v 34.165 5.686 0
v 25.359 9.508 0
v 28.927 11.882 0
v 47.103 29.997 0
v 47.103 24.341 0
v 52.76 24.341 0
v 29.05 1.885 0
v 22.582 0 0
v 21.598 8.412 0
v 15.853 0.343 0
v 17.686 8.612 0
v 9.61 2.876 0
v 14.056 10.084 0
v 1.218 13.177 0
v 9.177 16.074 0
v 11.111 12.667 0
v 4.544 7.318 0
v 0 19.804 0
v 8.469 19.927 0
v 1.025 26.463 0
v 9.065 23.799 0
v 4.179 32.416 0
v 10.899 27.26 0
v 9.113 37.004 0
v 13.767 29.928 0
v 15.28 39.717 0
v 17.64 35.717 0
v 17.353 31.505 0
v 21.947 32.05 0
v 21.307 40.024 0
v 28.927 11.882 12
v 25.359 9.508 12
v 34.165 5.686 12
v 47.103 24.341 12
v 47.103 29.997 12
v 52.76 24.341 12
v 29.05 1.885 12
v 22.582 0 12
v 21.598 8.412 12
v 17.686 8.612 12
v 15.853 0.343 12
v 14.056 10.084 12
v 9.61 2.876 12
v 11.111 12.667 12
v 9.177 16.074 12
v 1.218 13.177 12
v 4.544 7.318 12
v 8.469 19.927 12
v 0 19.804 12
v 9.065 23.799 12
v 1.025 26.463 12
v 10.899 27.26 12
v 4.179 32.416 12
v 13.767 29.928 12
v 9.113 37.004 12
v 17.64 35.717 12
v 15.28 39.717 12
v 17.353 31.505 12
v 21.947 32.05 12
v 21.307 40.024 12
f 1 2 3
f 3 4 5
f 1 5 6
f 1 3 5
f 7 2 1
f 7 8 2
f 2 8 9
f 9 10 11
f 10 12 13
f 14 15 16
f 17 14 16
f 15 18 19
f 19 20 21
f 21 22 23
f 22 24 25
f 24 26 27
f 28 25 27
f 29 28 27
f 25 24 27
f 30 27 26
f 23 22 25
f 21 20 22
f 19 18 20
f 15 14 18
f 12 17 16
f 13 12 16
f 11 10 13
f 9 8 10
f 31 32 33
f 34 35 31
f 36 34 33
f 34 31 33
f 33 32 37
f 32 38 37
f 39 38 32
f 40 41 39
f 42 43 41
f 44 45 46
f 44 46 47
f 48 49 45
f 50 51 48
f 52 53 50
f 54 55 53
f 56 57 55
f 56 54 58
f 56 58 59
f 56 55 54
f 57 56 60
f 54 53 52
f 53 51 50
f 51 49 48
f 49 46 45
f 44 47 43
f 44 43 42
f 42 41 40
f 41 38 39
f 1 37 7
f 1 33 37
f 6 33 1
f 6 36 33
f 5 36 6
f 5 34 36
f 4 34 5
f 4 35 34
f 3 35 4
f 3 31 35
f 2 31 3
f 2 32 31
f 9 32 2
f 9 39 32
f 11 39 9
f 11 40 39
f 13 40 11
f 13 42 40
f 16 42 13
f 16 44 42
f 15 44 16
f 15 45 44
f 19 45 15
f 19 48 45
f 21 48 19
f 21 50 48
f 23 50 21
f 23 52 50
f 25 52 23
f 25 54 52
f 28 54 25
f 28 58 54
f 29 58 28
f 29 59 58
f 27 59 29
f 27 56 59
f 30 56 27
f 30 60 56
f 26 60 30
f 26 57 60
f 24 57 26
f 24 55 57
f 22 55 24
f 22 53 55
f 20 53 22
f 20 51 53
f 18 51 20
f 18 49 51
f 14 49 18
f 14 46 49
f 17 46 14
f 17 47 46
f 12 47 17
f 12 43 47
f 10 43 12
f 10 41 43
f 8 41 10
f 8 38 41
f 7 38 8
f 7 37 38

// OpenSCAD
$fn = 32;

// ----------------------------------------------------------------------
// Eye lug: ring_tail, 12 mm thick
// ----------------------------------------------------------------------

// --- parameters (mm) ---
profile_height = 12;      // extrusion height
profile_points = 30;      // points of the closed outline

profile = [[17.64, 35.717], [21.307, 40.024], [15.28, 39.717], [9.113, 37.004], [4.179, 32.416], [1.025, 26.463], [0, 19.804], [1.218, 13.177], [4.544, 7.318], [9.61, 2.876], [15.853, 0.343], [22.582, 0], [29.05, 1.885], [34.165, 5.686], [52.76, 24.341], [47.103, 24.341], [47.103, 29.997], [28.927, 11.882], [25.359, 9.508], [21.598, 8.412], [17.686, 8.612], [14.056, 10.084], [11.111, 12.667], [9.177, 16.074], [8.469, 19.927], [9.065, 23.799], [10.899, 27.26], [13.767, 29.928], [17.353, 31.505], [21.947, 32.05]];  // single closed polygon, 30 points, counter clockwise

// --- the one profile operation ---
linear_extrude(height = profile_height) polygon(points = profile);
